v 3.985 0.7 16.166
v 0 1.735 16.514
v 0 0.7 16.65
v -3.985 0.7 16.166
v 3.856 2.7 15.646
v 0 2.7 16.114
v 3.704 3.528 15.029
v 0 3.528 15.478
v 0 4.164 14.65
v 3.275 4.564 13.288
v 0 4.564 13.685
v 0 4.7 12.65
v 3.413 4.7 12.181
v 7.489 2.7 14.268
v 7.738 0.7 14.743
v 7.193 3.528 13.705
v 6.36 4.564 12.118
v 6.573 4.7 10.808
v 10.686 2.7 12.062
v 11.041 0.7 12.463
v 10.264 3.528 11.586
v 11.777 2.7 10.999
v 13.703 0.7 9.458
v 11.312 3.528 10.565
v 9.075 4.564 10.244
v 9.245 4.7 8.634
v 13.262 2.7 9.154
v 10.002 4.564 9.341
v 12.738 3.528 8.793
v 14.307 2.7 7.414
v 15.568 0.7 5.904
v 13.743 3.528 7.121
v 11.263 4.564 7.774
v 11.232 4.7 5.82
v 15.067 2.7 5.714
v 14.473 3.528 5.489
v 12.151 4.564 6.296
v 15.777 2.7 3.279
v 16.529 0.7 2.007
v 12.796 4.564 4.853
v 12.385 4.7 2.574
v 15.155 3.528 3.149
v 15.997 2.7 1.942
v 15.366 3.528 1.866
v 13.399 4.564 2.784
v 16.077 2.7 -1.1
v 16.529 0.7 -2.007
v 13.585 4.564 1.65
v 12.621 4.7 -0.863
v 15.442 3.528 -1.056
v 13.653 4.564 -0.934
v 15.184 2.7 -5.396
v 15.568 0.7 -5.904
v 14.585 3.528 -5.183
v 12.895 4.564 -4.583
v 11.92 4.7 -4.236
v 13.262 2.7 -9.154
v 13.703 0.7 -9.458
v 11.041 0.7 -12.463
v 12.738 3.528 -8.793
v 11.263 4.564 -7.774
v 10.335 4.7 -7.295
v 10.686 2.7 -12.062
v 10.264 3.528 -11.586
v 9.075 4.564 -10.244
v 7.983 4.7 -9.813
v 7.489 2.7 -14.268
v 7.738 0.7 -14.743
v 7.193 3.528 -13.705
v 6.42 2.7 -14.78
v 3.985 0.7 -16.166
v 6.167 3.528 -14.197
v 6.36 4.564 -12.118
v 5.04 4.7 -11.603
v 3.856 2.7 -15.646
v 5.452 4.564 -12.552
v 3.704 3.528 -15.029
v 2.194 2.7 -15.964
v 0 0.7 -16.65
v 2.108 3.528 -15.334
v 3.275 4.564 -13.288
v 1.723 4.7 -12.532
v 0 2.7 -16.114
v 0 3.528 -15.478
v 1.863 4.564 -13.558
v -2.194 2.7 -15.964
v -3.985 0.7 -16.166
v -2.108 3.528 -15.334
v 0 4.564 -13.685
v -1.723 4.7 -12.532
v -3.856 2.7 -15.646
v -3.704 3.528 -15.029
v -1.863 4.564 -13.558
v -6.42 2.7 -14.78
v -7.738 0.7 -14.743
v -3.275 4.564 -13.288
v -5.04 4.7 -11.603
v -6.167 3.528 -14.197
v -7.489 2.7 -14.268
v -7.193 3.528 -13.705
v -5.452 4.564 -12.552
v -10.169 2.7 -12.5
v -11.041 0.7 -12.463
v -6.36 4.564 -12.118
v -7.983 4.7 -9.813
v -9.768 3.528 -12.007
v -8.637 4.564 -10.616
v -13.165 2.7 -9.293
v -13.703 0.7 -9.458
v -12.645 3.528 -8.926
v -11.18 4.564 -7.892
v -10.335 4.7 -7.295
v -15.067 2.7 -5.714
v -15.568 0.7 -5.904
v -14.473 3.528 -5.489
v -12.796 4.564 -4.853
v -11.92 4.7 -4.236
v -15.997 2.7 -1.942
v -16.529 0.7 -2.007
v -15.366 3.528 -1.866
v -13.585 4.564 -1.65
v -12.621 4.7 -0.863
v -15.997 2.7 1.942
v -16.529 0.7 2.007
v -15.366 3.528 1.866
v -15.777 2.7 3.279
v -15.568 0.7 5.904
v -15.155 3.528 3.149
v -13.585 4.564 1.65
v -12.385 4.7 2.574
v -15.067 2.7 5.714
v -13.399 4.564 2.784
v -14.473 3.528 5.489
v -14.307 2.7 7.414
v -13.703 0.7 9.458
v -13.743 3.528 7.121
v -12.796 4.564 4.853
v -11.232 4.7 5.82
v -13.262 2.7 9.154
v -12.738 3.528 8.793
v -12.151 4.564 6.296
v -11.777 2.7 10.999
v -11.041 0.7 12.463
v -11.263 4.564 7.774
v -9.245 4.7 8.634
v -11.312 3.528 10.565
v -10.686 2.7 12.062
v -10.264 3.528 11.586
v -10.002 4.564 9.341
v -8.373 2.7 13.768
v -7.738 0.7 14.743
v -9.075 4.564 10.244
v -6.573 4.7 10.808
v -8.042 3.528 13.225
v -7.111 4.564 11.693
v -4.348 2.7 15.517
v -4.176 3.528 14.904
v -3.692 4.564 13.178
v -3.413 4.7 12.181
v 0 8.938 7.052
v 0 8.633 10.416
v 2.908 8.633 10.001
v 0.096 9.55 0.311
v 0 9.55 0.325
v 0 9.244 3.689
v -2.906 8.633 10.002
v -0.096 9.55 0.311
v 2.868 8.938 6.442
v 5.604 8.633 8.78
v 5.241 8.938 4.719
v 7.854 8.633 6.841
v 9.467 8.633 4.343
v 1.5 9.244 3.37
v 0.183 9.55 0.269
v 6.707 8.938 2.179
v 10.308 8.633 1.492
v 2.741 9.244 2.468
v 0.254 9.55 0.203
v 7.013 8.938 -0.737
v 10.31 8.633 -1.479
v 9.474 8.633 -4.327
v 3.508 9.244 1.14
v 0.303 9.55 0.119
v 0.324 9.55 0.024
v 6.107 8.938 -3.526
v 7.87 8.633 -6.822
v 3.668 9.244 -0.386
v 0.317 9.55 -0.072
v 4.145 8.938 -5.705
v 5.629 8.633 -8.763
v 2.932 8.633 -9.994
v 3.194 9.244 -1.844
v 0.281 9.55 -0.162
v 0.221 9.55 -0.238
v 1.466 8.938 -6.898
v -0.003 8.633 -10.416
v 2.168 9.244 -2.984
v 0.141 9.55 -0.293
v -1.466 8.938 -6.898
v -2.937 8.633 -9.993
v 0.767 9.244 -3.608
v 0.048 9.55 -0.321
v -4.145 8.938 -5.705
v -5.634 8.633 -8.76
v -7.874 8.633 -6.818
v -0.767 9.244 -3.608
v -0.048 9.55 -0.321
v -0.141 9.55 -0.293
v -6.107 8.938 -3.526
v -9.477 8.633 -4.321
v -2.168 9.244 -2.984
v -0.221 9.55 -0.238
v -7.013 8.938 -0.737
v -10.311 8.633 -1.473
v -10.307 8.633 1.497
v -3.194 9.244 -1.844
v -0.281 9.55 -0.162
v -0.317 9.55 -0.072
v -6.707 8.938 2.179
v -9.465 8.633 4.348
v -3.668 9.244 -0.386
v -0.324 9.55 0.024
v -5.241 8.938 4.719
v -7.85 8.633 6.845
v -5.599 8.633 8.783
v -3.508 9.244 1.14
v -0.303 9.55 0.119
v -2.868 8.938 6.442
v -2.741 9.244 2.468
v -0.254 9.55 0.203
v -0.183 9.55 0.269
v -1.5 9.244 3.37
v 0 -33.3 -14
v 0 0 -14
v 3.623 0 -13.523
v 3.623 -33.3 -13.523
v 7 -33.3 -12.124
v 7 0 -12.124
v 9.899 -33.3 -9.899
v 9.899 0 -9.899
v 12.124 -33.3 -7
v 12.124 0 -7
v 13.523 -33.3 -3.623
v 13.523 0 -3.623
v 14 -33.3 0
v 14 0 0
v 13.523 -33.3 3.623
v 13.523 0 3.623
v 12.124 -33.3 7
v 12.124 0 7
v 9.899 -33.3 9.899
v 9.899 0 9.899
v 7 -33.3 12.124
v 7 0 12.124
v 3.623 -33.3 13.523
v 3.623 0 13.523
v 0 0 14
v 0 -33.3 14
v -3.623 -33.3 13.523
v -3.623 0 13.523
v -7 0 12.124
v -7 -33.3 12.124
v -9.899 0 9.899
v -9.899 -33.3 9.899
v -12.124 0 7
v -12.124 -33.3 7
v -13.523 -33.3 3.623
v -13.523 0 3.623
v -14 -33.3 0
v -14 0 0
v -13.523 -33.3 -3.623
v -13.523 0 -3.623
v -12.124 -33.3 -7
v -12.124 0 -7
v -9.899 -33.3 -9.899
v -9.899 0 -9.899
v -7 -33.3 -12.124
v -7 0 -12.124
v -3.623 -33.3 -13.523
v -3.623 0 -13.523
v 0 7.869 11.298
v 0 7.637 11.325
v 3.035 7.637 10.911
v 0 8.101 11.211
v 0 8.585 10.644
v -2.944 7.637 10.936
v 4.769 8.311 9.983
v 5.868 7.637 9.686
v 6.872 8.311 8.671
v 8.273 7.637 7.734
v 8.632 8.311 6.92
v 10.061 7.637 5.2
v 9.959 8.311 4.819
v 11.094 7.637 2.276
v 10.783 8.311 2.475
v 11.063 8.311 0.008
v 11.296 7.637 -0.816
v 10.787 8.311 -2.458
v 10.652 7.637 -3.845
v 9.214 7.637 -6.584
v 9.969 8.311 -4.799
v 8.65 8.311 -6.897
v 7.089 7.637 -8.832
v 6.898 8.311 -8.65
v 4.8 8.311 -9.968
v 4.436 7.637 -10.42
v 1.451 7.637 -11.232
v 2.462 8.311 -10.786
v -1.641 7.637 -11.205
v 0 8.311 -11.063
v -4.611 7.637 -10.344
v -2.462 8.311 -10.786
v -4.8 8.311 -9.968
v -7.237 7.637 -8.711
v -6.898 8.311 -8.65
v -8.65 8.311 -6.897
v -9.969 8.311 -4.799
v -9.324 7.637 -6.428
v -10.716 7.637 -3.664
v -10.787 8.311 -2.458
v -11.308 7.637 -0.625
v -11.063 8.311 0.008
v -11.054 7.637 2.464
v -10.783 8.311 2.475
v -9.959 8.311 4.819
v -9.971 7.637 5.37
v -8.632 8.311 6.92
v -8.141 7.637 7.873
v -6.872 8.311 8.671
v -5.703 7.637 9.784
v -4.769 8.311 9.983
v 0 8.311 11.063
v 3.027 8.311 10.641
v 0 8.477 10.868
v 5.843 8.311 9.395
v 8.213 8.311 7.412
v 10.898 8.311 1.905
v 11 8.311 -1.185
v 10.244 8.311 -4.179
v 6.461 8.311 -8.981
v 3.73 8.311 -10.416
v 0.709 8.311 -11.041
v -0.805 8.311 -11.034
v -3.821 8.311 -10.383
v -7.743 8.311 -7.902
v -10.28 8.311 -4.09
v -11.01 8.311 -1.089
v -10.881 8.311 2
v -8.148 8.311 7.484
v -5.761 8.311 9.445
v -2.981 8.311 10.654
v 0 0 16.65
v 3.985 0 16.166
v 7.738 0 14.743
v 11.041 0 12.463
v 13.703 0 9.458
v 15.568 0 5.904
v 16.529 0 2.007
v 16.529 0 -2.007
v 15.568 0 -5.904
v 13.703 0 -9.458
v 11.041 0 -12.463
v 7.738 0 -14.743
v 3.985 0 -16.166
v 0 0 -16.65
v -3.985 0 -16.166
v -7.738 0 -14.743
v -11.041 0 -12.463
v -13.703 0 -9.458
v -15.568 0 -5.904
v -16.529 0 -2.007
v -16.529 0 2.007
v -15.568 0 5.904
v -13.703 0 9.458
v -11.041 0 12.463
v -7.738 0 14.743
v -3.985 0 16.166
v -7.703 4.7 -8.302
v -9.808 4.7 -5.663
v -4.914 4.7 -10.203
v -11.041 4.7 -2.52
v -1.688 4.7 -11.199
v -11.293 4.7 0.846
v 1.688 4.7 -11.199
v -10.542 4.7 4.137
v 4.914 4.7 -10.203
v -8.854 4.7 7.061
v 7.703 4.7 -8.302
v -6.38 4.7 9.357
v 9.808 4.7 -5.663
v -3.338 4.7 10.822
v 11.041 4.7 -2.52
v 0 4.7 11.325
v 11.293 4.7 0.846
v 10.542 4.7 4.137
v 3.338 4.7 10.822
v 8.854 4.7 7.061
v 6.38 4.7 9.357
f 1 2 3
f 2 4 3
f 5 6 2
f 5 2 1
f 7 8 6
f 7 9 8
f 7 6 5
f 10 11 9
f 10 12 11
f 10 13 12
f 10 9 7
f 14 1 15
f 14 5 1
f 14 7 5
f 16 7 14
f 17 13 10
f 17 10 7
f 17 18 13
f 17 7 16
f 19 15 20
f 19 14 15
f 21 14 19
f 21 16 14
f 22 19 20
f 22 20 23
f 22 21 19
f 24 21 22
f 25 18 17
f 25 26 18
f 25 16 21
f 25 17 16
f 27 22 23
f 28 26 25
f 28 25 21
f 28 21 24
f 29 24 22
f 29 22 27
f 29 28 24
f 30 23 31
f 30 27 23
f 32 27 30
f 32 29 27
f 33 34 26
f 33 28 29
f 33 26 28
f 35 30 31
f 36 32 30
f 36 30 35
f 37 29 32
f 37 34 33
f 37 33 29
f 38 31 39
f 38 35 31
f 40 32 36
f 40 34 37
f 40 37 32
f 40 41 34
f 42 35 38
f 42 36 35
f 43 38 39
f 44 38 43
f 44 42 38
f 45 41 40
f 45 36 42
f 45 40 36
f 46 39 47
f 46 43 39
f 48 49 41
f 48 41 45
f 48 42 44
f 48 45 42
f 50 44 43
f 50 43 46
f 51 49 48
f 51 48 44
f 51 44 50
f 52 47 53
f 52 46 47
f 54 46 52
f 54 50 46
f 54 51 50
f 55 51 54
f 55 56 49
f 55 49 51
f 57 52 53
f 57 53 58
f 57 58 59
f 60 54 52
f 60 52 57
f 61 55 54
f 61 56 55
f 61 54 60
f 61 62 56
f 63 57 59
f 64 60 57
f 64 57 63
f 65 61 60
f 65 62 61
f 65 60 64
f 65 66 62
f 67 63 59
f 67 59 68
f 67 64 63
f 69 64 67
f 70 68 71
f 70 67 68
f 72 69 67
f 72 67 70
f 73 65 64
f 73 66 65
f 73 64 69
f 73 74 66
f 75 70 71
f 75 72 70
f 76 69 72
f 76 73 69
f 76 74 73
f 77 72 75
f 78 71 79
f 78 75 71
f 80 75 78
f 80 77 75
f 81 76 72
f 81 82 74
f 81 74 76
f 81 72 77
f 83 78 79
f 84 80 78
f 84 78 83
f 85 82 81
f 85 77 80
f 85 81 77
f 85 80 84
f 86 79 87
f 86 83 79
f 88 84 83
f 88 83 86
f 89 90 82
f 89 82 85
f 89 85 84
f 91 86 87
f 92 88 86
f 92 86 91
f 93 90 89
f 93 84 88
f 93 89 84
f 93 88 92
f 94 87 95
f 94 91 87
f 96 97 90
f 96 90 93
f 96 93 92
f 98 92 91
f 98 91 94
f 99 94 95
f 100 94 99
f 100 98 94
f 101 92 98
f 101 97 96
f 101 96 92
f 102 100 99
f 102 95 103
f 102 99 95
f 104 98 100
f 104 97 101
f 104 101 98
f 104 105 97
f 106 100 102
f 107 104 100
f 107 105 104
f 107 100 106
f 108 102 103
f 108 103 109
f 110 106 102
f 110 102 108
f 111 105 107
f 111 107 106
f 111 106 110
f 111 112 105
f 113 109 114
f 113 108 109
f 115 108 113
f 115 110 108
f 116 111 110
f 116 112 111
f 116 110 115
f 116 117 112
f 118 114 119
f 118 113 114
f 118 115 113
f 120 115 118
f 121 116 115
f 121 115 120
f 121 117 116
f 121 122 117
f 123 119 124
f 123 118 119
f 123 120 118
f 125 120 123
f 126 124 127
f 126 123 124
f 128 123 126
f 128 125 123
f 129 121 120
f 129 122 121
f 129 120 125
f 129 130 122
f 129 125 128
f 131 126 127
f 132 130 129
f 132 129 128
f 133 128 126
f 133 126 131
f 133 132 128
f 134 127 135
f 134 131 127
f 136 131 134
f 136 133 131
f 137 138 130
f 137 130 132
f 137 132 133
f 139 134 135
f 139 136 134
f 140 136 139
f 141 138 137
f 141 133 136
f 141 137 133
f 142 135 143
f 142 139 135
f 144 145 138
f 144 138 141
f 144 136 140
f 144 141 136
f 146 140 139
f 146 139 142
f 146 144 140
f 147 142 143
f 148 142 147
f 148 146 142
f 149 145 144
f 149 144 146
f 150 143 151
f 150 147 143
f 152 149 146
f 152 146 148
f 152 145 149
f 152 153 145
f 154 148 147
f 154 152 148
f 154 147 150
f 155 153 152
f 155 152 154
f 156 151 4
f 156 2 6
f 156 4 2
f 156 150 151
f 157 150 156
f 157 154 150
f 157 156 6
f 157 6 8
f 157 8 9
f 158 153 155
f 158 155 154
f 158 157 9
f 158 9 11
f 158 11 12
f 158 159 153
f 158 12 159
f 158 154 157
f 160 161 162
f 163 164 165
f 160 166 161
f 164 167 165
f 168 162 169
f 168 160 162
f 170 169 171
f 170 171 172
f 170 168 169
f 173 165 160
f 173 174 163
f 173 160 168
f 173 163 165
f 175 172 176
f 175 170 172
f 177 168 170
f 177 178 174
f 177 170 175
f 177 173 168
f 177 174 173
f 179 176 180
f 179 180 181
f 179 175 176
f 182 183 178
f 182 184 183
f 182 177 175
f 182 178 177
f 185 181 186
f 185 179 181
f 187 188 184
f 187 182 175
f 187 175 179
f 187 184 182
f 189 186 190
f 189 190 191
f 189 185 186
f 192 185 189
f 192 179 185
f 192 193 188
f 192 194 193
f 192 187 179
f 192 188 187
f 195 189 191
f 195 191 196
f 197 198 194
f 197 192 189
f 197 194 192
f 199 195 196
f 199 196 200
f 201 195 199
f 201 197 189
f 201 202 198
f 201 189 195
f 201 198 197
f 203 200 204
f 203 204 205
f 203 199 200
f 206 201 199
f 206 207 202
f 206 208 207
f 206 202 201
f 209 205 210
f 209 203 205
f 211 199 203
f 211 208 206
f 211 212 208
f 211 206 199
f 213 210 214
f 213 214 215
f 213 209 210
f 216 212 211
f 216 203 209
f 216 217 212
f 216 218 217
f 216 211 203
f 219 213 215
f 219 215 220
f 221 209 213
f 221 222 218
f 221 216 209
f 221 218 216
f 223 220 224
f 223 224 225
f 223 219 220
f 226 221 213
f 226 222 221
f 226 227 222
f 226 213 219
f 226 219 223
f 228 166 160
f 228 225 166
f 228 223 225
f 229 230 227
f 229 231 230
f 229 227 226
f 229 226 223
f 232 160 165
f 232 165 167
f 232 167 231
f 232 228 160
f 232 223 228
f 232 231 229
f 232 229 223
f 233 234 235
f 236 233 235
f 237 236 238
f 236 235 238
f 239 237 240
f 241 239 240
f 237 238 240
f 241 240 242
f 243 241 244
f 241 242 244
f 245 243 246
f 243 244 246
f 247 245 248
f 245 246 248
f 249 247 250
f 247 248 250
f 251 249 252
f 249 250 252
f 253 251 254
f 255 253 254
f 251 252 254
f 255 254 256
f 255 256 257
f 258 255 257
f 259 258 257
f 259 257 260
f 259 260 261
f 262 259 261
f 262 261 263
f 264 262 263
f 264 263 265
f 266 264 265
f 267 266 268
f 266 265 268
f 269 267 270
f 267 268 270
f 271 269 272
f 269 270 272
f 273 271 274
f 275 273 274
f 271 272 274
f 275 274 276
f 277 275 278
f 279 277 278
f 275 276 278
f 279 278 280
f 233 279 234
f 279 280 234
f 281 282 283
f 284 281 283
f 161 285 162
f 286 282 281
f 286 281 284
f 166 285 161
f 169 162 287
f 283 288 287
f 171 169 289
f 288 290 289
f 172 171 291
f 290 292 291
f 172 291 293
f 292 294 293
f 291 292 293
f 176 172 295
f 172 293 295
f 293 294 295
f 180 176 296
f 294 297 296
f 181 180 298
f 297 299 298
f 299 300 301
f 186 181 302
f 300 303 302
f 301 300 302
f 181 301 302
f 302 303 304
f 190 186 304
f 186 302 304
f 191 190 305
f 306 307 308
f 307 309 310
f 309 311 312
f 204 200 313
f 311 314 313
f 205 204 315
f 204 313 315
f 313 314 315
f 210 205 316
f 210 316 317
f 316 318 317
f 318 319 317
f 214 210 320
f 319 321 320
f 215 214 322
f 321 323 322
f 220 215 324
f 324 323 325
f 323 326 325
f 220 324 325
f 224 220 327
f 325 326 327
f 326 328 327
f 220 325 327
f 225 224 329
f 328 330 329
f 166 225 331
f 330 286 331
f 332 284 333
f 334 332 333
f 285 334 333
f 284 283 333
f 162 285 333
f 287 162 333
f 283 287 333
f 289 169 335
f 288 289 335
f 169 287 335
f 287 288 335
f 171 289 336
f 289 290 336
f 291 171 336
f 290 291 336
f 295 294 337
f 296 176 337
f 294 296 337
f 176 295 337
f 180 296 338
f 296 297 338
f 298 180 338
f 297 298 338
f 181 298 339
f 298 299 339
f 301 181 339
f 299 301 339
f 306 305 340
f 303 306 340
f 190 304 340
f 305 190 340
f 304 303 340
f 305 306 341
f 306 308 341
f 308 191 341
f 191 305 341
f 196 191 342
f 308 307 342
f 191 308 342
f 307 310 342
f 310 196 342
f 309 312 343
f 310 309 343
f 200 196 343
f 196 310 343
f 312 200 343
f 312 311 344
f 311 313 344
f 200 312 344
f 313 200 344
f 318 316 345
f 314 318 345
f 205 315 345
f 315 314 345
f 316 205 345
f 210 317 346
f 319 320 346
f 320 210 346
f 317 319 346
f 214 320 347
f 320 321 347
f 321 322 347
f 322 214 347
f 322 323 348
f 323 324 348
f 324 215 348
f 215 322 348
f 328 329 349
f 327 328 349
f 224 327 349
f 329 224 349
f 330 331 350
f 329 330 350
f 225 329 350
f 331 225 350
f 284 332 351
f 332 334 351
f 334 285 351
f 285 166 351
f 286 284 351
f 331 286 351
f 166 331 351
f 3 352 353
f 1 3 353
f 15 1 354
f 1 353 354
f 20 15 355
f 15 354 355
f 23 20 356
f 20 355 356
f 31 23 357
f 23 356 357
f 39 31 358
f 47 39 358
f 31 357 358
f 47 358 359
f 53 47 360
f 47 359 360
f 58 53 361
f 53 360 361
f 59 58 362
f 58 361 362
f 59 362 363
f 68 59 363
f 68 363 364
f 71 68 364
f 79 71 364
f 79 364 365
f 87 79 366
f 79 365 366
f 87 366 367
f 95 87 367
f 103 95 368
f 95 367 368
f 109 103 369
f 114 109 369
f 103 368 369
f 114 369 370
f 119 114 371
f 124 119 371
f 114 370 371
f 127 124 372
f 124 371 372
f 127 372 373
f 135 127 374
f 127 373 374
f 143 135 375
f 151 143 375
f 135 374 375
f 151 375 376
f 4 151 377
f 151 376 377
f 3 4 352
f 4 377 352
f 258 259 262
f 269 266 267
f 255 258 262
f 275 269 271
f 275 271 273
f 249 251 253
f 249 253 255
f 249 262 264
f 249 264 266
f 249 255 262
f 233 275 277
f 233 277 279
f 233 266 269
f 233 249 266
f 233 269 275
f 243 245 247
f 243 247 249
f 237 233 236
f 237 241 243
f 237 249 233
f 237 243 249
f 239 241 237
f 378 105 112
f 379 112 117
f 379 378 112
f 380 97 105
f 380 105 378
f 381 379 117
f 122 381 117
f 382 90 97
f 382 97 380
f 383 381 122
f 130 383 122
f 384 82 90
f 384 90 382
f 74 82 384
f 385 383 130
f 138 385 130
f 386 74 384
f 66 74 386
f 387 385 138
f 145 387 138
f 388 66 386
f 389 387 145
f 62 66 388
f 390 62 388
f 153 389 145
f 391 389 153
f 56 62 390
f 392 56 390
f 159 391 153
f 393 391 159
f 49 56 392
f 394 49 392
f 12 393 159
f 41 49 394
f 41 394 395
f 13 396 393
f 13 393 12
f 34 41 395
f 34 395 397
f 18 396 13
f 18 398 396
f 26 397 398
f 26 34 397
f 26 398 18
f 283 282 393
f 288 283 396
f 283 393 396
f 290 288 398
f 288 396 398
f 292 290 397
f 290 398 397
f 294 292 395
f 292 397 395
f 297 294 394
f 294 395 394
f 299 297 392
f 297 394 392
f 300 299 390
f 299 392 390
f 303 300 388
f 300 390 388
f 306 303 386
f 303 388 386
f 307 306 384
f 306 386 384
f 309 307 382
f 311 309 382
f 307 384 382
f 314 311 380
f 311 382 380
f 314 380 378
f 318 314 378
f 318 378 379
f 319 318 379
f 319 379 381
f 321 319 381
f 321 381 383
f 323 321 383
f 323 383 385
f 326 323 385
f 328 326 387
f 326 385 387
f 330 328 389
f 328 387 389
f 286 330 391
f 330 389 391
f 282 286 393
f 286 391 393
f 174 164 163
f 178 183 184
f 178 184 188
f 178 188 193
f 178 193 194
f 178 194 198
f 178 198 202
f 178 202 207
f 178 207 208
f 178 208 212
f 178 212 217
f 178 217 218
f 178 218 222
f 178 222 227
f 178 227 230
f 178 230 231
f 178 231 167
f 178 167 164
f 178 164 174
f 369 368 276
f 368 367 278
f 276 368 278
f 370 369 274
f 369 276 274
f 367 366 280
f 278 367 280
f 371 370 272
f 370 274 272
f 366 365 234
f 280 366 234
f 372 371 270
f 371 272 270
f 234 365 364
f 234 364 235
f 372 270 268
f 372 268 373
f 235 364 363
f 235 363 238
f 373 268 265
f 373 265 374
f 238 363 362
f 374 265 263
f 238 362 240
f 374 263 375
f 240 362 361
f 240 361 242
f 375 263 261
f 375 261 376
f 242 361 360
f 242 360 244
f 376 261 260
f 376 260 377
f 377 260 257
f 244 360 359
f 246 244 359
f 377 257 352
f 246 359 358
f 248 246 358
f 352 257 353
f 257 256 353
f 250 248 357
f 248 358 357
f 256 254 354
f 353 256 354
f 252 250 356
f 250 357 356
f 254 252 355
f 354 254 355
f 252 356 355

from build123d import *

# Parameters (mm, degrees)
SKETCH1_R           = 16.65
BOSS_EXTRUDE1_DEPTH = 4.7
SKETCH2_R           = 11.325
BOSS_EXTRUDE2_DEPTH = 4.85
SKETCH3_R           = 14
BOSS_EXTRUDE3_DEPTH = 33.3
FILLET1_R           = 4
CHAMFER1_SIZE       = 1
CHAMFER1_SIZE2      = 11
FILLET2_R           = 1


with BuildPart() as part:
    # Sketch1 → Boss-Extrude1 (new body)
    with BuildSketch(Plane(origin=(0, 0, 0), x_dir=(1, 0, 0), z_dir=(0, 1, 0))):
        with Locations(Location((0, 0, 0), (0, 0, 270))):
            Circle(SKETCH1_R)
    extrude(amount=BOSS_EXTRUDE1_DEPTH)

    # Sketch2 → Boss-Extrude2 (add)
    with BuildSketch(Plane(origin=(0, 4.7, 0), x_dir=(1, 0, 0), z_dir=(0, 1, 0))):
        with Locations(Location((0, 0, 0), (0, 0, 270))):
            Circle(SKETCH2_R)
    extrude(amount=BOSS_EXTRUDE2_DEPTH)

    # Sketch3 → Boss-Extrude3 (add)
    with BuildSketch(Plane.XZ):
        with Locations(Location((0, 0, 0), (0, 0, 270))):
            Circle(SKETCH3_R)
    extrude(amount=BOSS_EXTRUDE3_DEPTH)

    # Fillet1
    fillet1_edges = [part.edges().sort_by_distance(p)[0] for p in [
        (0, 4.7, -16.65),
    ]]
    fillet(fillet1_edges, radius=FILLET1_R)

    # Chamfer1
    chamfer1_edges = [part.edges().sort_by_distance(p)[0] for p in [
        (0, 9.55, -11.325),
    ]]
    chamfer1_side = [part.faces().sort_by_distance(p)[0] for p in [
        (0, 7.125, -11.325),
    ]]
    chamfer(chamfer1_edges, length=CHAMFER1_SIZE, length2=CHAMFER1_SIZE2, reference=chamfer1_side[0])

    # Fillet2
    fillet2_edges = [part.edges().sort_by_distance(p)[0] for p in [
        (0, 8.55, -11.325),
    ]]
    fillet(fillet2_edges, radius=FILLET2_R)


solid = part.part
